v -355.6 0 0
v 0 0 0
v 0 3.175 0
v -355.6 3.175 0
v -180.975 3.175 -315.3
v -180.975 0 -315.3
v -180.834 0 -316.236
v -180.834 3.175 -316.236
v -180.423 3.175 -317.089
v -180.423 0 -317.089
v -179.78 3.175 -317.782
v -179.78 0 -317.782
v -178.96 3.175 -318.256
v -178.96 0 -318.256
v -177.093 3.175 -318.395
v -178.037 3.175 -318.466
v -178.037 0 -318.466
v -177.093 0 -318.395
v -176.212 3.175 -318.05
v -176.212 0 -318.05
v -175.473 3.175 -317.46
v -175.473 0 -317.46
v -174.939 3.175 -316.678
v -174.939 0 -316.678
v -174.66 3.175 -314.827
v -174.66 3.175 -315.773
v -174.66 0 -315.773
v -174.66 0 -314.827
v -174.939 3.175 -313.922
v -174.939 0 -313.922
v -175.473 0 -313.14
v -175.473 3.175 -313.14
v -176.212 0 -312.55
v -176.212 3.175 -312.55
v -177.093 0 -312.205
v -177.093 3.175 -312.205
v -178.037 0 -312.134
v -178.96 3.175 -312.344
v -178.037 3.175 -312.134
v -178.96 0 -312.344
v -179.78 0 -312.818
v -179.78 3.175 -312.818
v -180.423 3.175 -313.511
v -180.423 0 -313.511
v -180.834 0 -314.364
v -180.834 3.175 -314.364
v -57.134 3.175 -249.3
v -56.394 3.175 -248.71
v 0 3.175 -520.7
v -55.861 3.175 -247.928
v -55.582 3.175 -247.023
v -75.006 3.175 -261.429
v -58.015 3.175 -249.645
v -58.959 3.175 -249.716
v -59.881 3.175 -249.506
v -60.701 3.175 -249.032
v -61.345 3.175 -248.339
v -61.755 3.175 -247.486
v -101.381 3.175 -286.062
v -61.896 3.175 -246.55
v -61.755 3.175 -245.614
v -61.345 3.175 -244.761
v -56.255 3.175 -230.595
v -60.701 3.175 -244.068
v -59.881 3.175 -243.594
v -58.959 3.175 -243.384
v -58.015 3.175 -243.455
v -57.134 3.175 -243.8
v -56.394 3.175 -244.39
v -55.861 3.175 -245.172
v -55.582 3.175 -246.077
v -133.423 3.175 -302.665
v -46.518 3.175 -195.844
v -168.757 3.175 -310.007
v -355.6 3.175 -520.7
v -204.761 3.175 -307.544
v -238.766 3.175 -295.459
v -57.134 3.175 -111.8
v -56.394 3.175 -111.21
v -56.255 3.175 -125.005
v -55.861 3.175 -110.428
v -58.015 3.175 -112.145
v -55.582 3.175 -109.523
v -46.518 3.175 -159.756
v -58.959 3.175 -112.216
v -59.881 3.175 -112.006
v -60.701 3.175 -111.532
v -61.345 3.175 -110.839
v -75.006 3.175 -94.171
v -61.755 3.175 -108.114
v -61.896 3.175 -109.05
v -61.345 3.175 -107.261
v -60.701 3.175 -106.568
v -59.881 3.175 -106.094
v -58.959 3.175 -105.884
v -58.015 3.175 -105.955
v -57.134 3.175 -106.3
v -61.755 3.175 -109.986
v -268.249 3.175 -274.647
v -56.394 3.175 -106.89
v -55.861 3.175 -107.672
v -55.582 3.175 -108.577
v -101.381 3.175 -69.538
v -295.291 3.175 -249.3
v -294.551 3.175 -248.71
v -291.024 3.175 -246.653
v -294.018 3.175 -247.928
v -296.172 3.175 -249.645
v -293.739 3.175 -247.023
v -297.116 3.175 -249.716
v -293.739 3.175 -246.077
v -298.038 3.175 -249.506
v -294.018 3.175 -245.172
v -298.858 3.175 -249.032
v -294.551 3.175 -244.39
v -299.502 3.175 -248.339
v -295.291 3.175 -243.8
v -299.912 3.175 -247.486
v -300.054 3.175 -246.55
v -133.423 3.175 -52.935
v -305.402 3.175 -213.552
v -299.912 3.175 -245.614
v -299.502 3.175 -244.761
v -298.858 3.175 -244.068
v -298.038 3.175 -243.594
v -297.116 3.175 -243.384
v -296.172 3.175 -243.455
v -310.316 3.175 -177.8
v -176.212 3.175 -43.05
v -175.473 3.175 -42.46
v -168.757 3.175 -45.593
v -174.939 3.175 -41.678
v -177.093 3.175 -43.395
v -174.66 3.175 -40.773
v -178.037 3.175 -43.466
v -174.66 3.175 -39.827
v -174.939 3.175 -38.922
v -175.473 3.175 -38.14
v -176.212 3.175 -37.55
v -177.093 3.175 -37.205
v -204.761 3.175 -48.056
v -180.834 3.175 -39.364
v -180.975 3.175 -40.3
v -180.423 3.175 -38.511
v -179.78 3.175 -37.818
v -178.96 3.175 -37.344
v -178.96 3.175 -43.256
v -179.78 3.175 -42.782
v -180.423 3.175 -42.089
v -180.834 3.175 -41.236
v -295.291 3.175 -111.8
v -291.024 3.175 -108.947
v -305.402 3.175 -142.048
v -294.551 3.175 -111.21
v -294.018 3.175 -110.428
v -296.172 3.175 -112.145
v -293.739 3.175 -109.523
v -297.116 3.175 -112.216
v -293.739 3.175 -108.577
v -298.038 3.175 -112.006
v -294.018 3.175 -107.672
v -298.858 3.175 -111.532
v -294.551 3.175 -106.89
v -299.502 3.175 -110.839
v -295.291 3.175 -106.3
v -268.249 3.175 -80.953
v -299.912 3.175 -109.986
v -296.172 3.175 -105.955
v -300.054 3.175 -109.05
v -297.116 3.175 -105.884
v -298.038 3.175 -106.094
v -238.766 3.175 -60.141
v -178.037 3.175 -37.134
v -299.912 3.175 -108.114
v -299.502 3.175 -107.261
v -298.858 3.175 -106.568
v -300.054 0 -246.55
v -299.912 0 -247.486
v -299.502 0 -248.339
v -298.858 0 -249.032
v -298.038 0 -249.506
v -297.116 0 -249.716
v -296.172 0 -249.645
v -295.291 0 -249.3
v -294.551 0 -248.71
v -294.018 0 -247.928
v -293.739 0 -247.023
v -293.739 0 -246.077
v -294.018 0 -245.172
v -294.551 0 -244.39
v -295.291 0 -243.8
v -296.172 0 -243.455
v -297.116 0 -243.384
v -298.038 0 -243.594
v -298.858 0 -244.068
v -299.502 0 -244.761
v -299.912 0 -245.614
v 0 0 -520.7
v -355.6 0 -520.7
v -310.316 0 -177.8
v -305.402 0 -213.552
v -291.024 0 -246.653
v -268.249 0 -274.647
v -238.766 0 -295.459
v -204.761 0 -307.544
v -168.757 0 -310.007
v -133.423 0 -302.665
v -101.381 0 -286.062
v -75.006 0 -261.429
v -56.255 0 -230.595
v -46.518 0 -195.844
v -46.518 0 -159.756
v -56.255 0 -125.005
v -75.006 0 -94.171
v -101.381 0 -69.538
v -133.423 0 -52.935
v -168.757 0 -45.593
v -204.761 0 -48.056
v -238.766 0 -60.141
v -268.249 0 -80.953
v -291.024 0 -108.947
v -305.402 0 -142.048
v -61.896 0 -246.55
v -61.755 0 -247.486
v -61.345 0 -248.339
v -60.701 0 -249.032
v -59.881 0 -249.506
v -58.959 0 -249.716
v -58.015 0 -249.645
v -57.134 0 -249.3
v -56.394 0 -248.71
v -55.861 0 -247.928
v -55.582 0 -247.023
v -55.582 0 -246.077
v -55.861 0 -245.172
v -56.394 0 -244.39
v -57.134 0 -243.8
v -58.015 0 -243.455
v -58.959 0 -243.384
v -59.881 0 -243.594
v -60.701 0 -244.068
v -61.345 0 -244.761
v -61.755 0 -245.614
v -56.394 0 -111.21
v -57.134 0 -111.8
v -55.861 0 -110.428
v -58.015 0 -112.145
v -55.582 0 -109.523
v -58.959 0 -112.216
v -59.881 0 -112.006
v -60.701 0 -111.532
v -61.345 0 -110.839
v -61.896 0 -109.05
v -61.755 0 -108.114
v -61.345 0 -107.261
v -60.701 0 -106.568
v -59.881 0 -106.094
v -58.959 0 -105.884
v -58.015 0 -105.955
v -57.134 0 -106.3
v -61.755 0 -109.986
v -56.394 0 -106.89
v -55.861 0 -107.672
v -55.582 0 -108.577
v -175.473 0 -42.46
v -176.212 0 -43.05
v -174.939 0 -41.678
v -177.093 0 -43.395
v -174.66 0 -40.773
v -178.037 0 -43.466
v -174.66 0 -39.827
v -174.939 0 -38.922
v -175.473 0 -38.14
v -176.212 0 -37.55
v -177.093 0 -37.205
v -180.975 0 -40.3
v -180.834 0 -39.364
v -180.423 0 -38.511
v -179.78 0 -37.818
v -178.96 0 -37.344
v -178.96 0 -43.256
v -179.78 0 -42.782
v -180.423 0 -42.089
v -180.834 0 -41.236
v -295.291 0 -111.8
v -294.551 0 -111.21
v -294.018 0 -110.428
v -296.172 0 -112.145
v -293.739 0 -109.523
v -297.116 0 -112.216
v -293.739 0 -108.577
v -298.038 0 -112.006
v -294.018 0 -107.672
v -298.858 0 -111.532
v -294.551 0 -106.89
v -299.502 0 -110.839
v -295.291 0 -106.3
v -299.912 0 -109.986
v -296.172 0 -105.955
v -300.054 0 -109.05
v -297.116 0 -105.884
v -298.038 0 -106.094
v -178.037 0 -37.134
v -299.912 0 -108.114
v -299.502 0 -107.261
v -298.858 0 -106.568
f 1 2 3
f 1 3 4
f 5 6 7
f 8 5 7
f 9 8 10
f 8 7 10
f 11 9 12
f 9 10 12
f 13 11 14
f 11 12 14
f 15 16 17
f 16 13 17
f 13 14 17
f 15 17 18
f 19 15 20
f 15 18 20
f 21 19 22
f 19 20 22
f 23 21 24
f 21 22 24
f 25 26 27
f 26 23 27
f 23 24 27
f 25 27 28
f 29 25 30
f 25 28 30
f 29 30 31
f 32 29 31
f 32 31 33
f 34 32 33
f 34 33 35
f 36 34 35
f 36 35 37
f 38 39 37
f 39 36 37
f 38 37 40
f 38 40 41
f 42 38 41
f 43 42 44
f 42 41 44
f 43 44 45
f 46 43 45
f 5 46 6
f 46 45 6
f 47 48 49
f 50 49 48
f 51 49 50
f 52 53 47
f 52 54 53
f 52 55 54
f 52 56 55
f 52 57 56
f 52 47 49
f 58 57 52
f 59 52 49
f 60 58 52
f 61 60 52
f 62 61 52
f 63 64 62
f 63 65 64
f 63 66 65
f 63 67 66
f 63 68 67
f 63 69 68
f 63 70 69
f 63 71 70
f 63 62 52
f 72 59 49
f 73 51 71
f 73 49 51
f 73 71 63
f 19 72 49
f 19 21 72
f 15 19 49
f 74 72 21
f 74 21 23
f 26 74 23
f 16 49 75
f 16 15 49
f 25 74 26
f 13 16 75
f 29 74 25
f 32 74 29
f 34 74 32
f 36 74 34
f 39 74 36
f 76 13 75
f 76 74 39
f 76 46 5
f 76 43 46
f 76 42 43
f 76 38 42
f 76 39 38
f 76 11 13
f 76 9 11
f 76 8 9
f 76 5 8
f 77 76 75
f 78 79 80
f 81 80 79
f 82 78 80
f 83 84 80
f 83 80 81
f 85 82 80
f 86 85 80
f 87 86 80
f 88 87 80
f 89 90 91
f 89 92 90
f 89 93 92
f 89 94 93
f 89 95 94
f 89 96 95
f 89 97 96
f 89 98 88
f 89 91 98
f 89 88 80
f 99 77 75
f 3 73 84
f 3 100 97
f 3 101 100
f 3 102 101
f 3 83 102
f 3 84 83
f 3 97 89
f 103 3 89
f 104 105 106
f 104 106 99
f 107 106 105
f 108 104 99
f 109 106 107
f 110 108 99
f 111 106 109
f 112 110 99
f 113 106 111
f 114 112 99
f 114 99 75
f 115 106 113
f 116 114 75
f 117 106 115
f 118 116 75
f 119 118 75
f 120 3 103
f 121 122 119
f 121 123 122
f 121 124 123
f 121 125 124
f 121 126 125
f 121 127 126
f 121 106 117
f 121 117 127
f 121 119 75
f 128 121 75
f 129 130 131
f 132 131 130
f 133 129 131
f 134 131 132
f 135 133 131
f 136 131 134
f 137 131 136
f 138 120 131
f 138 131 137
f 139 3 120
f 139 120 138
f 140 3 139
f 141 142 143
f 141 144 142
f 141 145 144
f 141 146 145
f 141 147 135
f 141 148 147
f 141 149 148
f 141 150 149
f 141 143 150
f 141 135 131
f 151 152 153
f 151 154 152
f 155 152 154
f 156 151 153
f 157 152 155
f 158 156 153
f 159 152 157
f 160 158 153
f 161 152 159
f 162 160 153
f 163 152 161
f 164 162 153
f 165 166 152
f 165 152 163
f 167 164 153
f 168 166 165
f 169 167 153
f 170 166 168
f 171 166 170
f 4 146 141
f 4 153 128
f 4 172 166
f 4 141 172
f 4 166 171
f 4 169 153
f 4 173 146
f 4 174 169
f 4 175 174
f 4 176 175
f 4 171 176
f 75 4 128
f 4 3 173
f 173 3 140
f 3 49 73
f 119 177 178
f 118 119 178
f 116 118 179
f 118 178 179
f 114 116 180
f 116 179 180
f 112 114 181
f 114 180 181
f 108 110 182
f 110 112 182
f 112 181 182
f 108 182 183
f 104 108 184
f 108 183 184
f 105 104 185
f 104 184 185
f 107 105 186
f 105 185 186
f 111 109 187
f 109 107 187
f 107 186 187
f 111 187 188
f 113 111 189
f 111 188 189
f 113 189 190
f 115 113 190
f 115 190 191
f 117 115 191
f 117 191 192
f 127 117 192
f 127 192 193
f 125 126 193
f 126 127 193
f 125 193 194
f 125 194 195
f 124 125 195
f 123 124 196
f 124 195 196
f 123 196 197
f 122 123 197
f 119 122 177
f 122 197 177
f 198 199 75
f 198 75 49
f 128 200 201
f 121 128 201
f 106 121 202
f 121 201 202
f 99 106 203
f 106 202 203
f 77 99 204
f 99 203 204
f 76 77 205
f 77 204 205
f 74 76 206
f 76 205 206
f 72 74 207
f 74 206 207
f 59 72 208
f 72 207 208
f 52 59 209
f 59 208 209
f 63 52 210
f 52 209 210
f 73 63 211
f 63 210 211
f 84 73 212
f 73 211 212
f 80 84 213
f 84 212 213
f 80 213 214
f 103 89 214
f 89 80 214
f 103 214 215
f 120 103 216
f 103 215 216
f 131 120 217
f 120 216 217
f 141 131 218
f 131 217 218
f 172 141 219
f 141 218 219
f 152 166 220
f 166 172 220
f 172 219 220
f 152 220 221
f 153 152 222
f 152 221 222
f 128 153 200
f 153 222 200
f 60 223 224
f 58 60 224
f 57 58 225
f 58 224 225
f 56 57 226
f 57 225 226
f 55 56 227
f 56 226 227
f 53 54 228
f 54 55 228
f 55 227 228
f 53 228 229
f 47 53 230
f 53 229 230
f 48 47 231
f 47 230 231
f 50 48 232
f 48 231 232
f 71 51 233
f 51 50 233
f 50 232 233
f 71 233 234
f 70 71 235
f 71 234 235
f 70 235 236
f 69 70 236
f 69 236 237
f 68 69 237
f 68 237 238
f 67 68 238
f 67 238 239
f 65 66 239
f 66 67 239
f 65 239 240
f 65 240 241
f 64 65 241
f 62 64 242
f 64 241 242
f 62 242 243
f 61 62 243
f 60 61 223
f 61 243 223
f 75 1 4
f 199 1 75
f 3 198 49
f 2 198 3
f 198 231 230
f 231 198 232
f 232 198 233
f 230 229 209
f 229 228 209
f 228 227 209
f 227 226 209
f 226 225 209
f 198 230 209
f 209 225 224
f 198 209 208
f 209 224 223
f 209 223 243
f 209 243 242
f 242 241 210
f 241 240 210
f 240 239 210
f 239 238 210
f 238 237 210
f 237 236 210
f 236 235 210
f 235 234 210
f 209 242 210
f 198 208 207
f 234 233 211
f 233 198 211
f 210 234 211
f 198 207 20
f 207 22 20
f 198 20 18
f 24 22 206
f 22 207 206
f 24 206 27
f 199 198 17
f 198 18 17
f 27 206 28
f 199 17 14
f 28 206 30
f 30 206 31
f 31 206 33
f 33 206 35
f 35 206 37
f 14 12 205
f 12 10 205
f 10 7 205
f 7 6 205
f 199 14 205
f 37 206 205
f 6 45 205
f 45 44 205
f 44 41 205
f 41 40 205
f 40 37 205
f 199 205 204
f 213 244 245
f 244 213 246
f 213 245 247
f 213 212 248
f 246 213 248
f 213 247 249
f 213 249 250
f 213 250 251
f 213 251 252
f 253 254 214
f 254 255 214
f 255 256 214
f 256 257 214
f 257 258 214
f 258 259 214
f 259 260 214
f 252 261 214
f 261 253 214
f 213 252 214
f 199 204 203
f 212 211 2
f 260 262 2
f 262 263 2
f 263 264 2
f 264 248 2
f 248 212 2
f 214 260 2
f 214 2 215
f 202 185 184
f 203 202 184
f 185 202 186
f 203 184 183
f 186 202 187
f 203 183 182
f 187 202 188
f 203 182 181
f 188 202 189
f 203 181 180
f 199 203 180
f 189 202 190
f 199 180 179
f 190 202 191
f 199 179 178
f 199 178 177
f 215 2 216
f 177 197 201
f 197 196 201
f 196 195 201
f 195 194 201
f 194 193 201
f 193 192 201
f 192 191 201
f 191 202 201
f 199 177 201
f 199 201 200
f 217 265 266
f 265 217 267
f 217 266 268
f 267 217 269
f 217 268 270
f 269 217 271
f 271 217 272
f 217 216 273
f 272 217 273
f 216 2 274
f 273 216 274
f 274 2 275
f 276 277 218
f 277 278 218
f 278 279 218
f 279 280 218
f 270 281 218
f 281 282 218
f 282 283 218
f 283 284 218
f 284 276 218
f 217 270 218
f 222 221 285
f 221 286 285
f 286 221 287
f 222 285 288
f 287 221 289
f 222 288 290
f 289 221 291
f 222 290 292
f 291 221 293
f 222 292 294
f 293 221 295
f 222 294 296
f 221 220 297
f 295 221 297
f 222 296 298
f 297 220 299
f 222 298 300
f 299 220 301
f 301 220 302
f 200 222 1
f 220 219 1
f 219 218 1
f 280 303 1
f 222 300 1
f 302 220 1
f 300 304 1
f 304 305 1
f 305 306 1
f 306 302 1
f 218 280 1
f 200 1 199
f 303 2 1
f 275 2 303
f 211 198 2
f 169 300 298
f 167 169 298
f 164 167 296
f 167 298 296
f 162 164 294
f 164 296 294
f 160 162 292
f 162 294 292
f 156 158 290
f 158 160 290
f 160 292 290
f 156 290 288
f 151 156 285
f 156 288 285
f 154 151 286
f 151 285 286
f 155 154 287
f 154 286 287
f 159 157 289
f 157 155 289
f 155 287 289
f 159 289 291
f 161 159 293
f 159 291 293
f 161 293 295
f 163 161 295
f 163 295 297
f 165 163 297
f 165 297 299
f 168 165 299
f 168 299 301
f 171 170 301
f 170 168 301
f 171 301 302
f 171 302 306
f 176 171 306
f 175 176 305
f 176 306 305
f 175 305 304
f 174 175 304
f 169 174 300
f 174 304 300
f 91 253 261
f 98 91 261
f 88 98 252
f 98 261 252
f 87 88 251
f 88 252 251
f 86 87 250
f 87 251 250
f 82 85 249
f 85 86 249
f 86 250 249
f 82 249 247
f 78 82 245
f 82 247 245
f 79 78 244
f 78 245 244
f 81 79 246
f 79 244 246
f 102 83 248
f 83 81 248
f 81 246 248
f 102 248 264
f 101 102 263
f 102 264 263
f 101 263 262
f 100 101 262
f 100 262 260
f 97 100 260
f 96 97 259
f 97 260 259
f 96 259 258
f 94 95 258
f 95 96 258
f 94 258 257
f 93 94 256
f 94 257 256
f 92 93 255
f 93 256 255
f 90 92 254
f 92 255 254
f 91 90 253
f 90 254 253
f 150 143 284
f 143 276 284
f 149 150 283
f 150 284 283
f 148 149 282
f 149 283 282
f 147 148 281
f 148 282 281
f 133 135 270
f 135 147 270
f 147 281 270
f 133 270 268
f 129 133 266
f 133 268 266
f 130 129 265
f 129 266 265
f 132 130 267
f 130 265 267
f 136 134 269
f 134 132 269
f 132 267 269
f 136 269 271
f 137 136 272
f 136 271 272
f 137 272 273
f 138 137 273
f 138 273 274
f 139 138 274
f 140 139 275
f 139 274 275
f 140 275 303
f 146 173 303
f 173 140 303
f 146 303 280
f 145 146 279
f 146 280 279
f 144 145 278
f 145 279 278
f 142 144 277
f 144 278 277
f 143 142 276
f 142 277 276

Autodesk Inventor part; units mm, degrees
ref_plane "YZ Plane" through (0, 0, 0) normal (1, 0, 0) x (0, 1, 0)
ref_plane "XZ Plane" through (0, 0, 0) normal (0, 1, 0) x (-1, 0, 0)
ref_plane "XY Plane" through (0, 0, 0) normal (0, 0, 1) x (1, 0, 0)
sketch "Sketch1" plane through (0, 0, 0) normal (0, 1, 0) x (-1, 0, 0)
  line L0 (0, 0) -> (355.6, 0)
  line L1 (355.6, 0) -> (355.6, -520.7)
  line L2 (355.6, -520.7) -> (0, -520.7)
  line L3 (0, -520.7) -> (0, 0)
  circle A0 centre (177.8, -177.8) radius 132.516
  circle A1 centre (177.8, -315.3) radius 3.175
  circle A2 centre (296.8785, -246.55) radius 3.175
  circle A3 centre (296.8785, -109.05) radius 3.175
  circle A4 centre (177.8, -40.3) radius 3.175
  circle A5 centre (58.7215, -109.05) radius 3.175
  circle A6 centre (58.7215, -246.55) radius 3.175
  line L4 (177.8, -177.8) -> (330.2, -177.8) construction
  line L5 (177.8, -177.8) -> (309.7823, -254) construction
  point P0 (177.8, -520.7)
  point P1 (355.6, -260.35)
  dimension "d0" = 355.6
  dimension "d1" = 520.7
  dimension "d2" = 265.032
  dimension "d5" = 177.8
  dimension "d6" = 6.35
  dimension "d7" = 137.5
  dimension "d10" = 360
  dimension "d17" = 152.4
  dimension "d18" = 152.4
  dimension "d19" = 30
  dimension "d22" = 177.8
extrude "Extrusion1" add sketch "Sketch1" along normal blind 3.175
properties part number "TurnTabletBasePlate"
